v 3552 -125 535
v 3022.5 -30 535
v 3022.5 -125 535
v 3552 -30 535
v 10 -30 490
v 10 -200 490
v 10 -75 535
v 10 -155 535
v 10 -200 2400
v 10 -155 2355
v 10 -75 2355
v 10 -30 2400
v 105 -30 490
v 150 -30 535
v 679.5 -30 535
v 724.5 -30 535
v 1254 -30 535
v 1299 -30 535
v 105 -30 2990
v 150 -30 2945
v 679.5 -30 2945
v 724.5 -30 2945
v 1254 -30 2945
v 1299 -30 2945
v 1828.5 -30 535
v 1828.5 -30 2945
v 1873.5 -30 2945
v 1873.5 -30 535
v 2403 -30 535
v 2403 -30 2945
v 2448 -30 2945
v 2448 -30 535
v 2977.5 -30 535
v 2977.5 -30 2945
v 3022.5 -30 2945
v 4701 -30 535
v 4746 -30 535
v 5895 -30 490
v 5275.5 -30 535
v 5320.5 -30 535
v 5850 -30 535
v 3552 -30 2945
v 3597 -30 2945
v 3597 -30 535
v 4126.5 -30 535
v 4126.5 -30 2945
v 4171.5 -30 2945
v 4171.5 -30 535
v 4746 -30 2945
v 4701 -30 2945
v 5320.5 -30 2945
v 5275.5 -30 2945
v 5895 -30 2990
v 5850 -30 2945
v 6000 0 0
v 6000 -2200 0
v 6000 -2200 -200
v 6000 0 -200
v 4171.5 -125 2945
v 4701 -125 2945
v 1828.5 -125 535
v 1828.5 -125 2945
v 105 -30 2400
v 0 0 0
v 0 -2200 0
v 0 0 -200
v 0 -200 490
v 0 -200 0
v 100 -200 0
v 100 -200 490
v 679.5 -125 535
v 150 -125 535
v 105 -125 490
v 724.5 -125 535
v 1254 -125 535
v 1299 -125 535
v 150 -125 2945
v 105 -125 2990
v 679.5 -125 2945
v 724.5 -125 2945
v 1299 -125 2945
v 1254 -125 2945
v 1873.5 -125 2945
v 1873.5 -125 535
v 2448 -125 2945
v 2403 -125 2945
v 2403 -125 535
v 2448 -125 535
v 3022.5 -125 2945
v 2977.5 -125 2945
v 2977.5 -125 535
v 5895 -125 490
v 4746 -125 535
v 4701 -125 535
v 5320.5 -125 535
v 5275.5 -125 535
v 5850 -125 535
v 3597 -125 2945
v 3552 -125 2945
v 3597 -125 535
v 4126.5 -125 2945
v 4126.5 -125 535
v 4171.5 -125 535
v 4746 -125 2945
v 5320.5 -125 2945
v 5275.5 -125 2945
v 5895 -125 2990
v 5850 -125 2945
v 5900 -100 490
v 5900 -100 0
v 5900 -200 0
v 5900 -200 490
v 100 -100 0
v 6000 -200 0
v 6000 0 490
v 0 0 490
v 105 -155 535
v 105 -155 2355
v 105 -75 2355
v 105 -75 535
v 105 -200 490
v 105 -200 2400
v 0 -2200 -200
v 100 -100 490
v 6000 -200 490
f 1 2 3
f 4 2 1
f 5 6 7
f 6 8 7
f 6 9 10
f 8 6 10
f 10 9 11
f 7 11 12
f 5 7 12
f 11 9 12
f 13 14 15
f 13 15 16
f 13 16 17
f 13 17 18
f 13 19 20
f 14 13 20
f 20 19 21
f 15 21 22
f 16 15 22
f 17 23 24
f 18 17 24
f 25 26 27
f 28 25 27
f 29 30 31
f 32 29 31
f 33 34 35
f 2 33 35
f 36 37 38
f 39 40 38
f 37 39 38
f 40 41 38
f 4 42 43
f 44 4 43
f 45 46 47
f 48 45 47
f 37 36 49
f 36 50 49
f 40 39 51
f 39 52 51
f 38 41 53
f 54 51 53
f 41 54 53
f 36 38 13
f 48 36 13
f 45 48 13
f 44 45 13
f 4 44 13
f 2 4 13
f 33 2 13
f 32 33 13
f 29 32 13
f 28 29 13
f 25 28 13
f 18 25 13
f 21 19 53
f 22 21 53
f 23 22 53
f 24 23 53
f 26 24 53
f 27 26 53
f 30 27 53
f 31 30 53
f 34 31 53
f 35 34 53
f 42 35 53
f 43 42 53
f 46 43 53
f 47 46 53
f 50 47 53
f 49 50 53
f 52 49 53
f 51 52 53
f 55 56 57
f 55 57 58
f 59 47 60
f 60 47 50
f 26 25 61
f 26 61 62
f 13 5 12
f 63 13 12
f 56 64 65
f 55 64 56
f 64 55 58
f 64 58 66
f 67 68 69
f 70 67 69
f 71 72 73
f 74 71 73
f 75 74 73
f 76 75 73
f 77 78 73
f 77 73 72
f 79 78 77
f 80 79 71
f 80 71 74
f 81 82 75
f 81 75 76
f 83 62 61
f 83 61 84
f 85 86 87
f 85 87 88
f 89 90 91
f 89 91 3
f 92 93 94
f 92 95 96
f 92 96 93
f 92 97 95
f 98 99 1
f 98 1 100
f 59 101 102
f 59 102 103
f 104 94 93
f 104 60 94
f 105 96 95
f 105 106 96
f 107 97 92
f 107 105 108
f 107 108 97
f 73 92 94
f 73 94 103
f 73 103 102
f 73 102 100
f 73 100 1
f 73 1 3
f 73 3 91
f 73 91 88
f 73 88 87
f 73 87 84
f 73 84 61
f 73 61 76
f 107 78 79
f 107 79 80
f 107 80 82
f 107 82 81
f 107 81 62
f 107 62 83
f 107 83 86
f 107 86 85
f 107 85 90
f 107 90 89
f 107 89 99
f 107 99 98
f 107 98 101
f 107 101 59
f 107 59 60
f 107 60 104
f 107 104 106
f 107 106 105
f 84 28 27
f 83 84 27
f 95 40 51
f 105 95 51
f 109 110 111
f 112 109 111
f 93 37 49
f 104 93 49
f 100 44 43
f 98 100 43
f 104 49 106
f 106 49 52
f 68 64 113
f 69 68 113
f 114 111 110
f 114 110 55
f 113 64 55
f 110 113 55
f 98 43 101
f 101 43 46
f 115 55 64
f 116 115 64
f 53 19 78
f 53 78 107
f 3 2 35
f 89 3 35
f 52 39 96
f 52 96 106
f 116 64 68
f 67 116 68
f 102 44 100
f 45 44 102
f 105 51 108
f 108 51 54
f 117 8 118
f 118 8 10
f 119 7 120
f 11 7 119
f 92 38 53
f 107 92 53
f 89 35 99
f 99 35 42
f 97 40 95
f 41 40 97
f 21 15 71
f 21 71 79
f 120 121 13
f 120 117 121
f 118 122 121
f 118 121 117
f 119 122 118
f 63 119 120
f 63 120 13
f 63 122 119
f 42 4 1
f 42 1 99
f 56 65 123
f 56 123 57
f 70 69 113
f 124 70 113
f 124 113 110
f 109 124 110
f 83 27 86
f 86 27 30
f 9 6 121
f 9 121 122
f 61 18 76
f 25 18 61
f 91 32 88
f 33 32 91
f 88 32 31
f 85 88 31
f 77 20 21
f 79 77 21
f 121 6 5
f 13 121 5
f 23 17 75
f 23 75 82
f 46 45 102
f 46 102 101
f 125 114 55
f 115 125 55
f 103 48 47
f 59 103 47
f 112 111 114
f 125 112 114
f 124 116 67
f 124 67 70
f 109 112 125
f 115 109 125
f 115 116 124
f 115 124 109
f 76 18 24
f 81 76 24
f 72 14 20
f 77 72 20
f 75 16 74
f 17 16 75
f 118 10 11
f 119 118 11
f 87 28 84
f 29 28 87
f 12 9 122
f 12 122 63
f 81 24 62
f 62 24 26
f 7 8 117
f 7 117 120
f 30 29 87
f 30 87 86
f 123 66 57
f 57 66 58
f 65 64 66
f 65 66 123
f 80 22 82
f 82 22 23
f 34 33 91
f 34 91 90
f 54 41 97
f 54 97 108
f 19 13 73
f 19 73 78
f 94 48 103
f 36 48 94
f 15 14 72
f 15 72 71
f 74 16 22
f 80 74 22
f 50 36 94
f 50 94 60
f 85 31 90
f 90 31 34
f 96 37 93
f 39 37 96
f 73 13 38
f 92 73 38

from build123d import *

# Parameters (mm, degrees)
F4_DEPTH = 200
F5_DEPTH = 490
F6_START = 10
F2_W     = 170
F2_H     = 1910
F2_W_2   = 80
F2_H_2   = 1820
F6_DEPTH = 95
F7_START = 30
F3_W     = 5790
F3_H     = 2500
F3_W_2   = 529.5
F3_H_2   = 2410
F7_DEPTH = 95


with BuildPart() as f4:
    # F0 (on Top) → F4 (new body, through all)
    with BuildSketch(Plane.XY):
        Polygon((100, -200), (0, -200), (0, -2200), (6000, -2200), (6000, -200), (5900, -200), (5900, -100), (100, -100), align=None)
        Polygon((6000, 0), (0, 0), (0, -200), (100, -200), (100, -100), (5900, -100), (5900, -200), (6000, -200), align=None)
    extrude(amount=-F4_DEPTH)


with BuildPart() as f5:
    # F0 (on Top) → F5 (new body, through all)
    with BuildSketch(Plane.XY):
        Polygon((6000, 0), (0, 0), (0, -200), (100, -200), (100, -100), (5900, -100), (5900, -200), (6000, -200), align=None)
    extrude(amount=F5_DEPTH)


with BuildPart() as f6:
    # F2 (on Right) → F6 (new body)
    with BuildSketch(Plane.YZ.offset(F6_START)):
        with Locations((-115, 1445)):
            Rectangle(F2_W, F2_H)
        with Locations((-115, 1445)):
            Rectangle(F2_W_2, F2_H_2, mode=Mode.SUBTRACT)
    extrude(amount=F6_DEPTH)


with BuildPart() as f7:
    # F3 (on Front) → F7 (new body)
    with BuildSketch(Plane.XZ.offset(F7_START)):
        with Locations((3000, 1740)):
            Rectangle(F3_W, F3_H)
        with Locations((414.75, 1740)):
            Rectangle(F3_W_2, F3_H_2, mode=Mode.SUBTRACT)
        with Locations((989.25, 1740)):
            Rectangle(F3_W_2, F3_H_2, mode=Mode.SUBTRACT)
        with Locations((1563.75, 1740)):
            Rectangle(F3_W_2, F3_H_2, mode=Mode.SUBTRACT)
        with Locations((2138.25, 1740)):
            Rectangle(F3_W_2, F3_H_2, mode=Mode.SUBTRACT)
        with Locations((2712.75, 1740)):
            Rectangle(F3_W_2, F3_H_2, mode=Mode.SUBTRACT)
        with Locations((3287.25, 1740)):
            Rectangle(F3_W_2, F3_H_2, mode=Mode.SUBTRACT)
        with Locations((3861.75, 1740)):
            Rectangle(F3_W_2, F3_H_2, mode=Mode.SUBTRACT)
        with Locations((4436.25, 1740)):
            Rectangle(F3_W_2, F3_H_2, mode=Mode.SUBTRACT)
        with Locations((5010.75, 1740)):
            Rectangle(F3_W_2, F3_H_2, mode=Mode.SUBTRACT)
        with Locations((5585.25, 1740)):
            Rectangle(F3_W_2, F3_H_2, mode=Mode.SUBTRACT)
    extrude(amount=F7_DEPTH)


solid = Compound([f4.part, f5.part, f6.part, f7.part])
